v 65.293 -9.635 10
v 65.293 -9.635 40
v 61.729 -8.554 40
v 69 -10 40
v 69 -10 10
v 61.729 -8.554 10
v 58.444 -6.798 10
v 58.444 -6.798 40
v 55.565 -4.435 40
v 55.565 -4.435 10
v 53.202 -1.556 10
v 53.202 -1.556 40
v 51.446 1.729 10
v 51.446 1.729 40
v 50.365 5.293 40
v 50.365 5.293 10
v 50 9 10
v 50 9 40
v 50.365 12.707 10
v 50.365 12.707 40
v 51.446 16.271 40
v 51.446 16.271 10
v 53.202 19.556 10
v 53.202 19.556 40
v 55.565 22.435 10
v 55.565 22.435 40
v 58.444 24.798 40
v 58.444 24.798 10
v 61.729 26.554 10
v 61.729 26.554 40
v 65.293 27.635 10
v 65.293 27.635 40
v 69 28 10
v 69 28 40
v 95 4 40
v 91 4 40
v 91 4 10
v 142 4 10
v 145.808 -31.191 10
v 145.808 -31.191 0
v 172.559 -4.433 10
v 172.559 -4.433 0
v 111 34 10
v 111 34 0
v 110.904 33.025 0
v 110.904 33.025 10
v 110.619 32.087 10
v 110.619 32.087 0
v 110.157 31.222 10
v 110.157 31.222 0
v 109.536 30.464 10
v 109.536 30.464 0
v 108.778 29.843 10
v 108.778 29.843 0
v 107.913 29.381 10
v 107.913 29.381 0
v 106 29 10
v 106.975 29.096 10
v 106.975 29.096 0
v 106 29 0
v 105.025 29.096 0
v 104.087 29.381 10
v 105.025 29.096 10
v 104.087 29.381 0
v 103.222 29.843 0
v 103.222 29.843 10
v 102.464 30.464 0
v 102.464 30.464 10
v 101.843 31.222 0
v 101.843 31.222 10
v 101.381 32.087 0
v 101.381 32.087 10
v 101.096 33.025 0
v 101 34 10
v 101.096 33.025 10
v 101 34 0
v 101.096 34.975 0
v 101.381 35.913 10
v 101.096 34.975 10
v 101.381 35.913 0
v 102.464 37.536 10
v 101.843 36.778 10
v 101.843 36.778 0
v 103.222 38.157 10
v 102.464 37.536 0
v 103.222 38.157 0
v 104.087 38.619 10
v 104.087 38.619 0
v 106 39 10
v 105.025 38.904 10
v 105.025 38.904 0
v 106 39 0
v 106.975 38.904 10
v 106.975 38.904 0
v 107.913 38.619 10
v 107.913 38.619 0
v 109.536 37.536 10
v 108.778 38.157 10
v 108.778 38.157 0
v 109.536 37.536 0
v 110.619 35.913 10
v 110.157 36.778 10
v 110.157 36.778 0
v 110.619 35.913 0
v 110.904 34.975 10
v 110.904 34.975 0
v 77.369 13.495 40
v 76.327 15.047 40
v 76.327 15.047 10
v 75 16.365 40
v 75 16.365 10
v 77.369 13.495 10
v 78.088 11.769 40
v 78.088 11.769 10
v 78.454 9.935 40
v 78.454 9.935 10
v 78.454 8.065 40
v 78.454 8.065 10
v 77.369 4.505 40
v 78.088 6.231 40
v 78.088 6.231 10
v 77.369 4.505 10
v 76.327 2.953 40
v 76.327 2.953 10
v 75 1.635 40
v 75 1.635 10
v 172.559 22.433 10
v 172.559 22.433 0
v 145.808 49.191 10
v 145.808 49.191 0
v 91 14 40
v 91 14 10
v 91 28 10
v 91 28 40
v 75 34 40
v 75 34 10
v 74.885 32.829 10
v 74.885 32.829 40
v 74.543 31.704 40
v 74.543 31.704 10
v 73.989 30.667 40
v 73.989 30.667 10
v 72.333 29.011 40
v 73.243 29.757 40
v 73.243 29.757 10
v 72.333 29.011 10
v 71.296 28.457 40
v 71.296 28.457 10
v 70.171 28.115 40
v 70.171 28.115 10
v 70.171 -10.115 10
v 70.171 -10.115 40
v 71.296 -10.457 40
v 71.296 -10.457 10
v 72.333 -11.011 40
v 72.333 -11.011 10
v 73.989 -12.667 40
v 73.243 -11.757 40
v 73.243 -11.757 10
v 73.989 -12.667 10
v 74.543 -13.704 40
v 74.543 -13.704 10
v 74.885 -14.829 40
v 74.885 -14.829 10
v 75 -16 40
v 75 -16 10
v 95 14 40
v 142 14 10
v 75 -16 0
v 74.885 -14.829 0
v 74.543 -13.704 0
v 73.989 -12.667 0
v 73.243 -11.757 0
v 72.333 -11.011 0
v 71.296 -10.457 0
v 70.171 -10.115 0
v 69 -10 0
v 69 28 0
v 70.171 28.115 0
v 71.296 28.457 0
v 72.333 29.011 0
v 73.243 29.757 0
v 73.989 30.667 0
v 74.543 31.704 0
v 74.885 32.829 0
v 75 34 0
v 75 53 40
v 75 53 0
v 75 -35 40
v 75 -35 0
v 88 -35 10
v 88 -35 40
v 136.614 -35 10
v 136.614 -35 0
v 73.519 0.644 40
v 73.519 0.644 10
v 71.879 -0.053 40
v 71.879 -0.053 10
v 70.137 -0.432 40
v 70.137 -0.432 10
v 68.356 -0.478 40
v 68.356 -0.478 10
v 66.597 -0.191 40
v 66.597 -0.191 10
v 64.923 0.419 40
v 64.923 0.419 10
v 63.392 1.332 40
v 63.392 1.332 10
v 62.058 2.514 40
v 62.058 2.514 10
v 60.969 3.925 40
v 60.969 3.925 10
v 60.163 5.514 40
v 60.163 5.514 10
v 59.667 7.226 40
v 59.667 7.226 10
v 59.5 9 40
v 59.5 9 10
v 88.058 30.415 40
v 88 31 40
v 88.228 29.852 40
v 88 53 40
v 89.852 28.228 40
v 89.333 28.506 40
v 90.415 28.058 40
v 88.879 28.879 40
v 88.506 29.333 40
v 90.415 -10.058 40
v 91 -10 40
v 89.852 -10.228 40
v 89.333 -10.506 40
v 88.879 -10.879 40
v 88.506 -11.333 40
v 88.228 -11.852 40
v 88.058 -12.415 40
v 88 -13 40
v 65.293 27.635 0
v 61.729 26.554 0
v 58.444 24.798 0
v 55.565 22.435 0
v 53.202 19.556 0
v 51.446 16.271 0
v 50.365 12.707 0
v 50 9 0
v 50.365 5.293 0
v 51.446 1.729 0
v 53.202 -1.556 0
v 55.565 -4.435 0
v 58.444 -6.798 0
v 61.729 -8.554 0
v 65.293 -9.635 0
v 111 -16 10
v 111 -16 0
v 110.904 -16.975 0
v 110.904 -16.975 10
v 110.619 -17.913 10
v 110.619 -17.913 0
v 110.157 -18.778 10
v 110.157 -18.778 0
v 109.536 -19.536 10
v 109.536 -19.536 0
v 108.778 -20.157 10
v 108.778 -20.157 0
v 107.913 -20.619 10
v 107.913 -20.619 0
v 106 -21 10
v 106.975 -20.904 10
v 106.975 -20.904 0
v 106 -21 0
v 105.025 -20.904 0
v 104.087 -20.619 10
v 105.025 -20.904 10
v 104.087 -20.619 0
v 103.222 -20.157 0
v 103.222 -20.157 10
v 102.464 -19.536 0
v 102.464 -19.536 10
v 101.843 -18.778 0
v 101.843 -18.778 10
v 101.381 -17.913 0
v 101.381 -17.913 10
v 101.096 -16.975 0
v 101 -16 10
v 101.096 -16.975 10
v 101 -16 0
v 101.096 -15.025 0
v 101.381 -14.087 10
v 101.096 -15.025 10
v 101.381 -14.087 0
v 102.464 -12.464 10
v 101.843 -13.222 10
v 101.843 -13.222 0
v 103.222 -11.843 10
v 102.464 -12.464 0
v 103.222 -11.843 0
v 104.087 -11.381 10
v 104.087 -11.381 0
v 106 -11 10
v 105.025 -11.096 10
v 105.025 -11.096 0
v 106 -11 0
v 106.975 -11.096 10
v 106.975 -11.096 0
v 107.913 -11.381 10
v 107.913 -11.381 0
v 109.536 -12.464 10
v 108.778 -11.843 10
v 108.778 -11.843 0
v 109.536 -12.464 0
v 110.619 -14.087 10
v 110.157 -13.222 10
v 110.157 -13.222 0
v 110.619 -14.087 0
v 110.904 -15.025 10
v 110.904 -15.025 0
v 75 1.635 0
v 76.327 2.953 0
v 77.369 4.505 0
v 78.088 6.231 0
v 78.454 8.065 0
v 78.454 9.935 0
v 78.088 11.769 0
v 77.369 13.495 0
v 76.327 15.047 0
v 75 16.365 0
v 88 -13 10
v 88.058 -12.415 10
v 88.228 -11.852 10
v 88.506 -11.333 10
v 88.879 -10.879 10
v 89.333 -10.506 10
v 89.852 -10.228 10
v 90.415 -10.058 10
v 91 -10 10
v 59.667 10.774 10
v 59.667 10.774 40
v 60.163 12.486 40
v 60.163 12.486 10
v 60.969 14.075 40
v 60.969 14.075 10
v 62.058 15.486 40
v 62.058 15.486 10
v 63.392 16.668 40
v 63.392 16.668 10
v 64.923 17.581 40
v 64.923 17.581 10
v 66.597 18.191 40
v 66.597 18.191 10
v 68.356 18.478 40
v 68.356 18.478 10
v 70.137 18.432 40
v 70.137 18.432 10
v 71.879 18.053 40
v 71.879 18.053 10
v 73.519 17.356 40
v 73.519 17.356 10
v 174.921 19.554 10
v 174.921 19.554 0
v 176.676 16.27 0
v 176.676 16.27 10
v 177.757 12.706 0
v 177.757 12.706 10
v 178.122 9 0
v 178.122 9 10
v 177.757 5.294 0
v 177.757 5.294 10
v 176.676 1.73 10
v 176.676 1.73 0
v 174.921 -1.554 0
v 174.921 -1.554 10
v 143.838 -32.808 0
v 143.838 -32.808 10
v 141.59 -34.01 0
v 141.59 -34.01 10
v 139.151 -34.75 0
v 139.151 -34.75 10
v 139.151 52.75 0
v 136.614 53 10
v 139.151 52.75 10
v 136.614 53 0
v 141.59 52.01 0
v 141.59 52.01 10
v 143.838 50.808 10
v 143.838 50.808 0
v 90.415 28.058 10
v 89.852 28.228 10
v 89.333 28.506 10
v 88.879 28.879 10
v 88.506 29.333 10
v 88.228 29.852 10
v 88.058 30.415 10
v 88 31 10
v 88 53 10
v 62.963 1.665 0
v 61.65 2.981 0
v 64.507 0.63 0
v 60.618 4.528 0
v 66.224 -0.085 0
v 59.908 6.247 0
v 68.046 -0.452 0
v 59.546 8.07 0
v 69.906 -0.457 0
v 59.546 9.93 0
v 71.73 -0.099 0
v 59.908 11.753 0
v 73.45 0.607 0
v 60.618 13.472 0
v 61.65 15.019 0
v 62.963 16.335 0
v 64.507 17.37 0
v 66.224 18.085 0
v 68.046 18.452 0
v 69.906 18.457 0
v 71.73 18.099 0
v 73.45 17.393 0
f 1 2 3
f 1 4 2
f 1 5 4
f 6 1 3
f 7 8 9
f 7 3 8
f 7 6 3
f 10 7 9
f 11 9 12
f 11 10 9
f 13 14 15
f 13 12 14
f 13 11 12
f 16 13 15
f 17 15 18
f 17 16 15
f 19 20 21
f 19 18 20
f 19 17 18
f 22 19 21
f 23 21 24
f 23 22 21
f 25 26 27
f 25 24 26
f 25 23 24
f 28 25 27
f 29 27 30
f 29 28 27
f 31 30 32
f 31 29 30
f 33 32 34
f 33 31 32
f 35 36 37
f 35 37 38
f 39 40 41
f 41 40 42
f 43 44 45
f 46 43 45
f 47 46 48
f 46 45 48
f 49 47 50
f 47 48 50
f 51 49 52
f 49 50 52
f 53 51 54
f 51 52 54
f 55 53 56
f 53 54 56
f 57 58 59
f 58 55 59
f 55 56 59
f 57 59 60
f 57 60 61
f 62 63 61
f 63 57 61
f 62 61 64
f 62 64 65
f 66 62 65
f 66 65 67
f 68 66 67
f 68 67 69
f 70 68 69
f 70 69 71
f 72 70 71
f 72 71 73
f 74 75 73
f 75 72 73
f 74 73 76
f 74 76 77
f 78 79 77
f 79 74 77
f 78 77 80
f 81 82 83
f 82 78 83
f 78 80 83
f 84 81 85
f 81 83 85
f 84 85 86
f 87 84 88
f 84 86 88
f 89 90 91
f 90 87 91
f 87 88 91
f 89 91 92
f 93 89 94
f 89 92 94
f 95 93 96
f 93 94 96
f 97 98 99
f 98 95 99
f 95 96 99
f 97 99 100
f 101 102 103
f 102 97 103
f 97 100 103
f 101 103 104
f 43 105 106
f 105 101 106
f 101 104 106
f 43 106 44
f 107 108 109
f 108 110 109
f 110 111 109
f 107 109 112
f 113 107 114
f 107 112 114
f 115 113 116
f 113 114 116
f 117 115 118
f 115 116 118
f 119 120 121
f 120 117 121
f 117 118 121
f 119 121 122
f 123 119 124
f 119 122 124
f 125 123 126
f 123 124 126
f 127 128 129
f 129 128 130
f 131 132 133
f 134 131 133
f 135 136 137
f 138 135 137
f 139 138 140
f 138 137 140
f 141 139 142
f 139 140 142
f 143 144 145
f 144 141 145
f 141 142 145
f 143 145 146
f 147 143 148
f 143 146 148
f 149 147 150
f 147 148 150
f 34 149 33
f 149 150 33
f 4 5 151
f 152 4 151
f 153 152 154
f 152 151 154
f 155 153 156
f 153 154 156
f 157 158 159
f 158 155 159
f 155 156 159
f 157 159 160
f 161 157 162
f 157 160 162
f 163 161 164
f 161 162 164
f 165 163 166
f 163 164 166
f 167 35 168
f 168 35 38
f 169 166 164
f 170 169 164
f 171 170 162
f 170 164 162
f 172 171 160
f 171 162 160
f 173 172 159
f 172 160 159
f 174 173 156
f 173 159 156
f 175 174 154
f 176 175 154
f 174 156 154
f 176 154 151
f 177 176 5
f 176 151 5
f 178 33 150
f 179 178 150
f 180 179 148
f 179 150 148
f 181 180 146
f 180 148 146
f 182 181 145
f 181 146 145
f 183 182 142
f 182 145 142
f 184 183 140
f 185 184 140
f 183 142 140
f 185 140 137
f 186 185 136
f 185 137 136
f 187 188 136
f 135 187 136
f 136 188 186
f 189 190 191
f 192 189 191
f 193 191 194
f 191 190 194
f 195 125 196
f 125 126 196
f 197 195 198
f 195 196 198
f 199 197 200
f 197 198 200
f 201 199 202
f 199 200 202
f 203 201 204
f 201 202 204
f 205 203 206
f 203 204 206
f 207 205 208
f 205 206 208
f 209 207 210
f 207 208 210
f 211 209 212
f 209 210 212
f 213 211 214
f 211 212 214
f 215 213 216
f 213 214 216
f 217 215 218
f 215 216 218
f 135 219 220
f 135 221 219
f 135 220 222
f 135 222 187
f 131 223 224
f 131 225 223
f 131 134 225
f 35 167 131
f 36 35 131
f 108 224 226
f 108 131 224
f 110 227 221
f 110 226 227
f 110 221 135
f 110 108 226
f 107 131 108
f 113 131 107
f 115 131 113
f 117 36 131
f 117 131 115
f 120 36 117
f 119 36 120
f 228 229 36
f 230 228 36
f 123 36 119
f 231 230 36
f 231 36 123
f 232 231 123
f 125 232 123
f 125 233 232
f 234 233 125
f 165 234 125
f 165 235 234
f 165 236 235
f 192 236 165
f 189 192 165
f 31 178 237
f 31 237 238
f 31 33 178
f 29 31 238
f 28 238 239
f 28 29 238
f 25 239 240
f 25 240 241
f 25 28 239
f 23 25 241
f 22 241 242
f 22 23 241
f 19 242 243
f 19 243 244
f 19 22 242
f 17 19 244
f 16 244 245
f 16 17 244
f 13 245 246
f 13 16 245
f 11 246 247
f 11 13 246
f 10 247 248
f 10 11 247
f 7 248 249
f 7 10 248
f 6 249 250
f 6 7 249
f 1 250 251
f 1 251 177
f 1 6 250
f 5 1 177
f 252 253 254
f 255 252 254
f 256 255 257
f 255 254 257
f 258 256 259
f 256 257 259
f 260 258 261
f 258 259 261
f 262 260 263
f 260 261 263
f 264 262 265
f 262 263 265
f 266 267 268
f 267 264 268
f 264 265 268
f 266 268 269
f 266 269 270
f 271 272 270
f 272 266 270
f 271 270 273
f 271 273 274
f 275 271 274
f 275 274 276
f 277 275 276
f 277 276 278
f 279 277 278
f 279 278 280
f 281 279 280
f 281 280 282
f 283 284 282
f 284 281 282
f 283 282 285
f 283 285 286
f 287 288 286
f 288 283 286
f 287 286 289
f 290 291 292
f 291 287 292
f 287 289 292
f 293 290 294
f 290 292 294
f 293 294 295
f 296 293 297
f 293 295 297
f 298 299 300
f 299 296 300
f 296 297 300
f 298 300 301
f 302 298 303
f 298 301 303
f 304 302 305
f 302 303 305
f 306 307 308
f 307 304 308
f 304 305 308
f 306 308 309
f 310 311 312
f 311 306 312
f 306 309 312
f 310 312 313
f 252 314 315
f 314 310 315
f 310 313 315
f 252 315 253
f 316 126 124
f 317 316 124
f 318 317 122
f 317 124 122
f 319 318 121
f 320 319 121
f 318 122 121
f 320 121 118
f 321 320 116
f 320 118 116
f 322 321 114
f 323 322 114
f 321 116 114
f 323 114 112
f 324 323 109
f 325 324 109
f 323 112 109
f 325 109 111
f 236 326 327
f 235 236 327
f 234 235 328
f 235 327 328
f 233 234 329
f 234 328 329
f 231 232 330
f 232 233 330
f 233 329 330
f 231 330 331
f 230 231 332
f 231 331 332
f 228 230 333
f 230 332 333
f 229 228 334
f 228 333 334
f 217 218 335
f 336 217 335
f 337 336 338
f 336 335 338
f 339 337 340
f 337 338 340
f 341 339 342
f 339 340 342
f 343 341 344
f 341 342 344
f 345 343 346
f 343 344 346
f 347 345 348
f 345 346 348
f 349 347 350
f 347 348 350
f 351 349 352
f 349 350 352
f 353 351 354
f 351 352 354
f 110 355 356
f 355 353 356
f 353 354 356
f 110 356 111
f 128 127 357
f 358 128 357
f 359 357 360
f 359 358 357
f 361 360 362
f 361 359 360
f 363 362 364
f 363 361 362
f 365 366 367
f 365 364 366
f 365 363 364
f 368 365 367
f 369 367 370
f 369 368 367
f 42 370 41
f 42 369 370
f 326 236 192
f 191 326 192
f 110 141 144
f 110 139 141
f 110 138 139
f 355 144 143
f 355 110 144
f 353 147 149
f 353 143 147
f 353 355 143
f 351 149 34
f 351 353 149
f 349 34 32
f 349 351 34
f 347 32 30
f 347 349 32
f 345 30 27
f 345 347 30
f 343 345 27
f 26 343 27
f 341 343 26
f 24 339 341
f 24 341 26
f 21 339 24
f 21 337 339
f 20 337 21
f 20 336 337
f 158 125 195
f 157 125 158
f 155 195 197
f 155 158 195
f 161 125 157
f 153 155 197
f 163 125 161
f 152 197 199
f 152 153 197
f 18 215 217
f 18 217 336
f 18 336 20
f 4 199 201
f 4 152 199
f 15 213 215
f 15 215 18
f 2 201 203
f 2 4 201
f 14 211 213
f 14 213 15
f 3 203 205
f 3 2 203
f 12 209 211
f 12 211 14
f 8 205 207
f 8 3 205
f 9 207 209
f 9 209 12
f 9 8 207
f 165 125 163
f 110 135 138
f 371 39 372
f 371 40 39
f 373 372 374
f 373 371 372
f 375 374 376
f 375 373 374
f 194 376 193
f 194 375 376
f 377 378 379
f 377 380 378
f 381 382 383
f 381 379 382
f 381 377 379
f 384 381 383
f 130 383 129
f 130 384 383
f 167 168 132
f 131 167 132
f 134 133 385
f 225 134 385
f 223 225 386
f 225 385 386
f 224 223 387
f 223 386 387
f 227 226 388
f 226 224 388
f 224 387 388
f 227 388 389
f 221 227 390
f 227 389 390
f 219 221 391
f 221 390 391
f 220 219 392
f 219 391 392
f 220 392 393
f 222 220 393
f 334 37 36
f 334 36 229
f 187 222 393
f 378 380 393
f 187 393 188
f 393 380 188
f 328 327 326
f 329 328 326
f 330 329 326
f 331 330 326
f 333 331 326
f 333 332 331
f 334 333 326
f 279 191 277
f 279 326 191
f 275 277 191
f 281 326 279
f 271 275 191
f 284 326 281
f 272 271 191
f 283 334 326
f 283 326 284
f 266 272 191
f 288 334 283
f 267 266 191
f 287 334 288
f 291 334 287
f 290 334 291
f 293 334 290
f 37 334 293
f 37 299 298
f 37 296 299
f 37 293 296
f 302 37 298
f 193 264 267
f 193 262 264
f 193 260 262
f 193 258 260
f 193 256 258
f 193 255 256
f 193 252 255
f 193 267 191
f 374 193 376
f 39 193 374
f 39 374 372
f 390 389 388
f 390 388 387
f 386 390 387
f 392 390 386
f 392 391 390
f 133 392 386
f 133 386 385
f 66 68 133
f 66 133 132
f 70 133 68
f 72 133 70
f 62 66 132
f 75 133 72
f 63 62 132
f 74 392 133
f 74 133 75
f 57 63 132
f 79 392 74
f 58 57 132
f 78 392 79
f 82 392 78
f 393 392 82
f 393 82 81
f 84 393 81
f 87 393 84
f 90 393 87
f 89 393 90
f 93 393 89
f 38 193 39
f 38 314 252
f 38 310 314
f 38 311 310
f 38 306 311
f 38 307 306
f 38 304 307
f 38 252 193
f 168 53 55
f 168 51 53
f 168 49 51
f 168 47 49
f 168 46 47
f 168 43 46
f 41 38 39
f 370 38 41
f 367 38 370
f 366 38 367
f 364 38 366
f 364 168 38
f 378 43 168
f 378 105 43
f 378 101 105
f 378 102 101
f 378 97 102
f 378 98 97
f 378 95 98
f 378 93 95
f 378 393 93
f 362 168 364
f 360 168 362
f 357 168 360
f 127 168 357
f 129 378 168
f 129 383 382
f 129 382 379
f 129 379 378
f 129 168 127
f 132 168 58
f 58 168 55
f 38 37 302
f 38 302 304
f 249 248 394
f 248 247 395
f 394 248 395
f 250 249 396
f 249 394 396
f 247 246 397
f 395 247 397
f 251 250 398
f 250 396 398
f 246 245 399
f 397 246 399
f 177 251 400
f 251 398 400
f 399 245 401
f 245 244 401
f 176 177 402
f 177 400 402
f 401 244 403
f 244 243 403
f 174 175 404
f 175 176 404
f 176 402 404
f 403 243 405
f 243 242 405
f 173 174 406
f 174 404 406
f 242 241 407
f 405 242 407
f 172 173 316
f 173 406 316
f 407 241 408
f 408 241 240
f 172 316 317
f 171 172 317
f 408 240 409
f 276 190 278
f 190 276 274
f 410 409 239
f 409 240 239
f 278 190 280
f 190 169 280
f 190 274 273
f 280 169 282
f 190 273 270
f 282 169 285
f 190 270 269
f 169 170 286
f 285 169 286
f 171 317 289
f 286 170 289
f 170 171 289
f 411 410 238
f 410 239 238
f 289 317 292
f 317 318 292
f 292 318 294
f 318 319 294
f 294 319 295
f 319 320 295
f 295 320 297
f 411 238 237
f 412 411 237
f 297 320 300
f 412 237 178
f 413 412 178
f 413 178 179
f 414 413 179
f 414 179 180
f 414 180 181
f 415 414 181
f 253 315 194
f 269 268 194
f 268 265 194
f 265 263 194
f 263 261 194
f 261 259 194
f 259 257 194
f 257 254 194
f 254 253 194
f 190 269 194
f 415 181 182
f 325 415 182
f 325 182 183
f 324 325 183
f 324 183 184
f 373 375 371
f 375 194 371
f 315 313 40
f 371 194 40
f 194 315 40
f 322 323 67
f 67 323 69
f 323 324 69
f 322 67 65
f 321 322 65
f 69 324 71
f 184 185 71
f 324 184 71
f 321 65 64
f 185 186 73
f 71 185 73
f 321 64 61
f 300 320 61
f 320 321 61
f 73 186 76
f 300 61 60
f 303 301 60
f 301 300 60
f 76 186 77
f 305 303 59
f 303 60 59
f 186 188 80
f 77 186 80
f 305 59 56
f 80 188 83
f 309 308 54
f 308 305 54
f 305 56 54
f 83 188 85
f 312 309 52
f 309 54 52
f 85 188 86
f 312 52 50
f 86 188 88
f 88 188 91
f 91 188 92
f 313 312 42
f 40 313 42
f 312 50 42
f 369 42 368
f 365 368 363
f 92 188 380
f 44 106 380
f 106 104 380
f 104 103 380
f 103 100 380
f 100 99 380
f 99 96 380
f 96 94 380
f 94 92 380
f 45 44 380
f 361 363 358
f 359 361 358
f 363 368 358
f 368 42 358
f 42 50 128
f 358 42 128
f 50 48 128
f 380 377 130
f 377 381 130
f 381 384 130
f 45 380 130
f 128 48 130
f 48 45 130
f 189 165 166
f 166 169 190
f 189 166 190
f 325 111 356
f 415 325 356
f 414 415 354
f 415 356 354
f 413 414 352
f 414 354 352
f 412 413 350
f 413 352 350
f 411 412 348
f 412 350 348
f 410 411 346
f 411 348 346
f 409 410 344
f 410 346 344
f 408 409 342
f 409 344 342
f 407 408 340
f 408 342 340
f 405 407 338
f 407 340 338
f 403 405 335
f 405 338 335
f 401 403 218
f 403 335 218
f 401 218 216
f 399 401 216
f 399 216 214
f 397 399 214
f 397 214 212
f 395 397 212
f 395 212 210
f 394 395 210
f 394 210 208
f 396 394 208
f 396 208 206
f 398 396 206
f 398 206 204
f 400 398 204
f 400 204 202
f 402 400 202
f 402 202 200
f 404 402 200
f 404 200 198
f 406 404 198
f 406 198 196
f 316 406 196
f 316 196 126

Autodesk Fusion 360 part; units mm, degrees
sketch "base" plane through (0, 0, 0) normal (0, 0, 1) x (1, 0, 0)
  line L0 (75, -35) -> (136.6142, -35)
  line L1 (142, -35) -> (142, 53)
  line L2 (136.6142, 53) -> (75, 53)
  line L3 (75, 53) -> (75, -35)
  line L4 (142, 9) -> (142, 14)
  line L5 (142, 9) -> (142, 4)
  line L6 (136.6142, 53) -> (106, 53)
  line L7 (142, 9) -> (142, 34)
  circle A0 centre (106, 34) radius 5
  line L8 (142, 9) -> (75, 9) construction
  circle A1 centre (106, -16) radius 5
  line L9 (145.8078, -31.1912) -> (172.5588, -4.4333)
  line L10 (172.5588, 22.4333) -> (145.8078, 49.1912)
  arc A2 (172.5588, -4.4333) -> (172.5588, 22.4333) centre (159.122, 9) ccw
  arc A3 (136.6142, -35) -> (145.8078, -31.1912) centre (136.6142, -22) ccw
  arc A4 (145.8078, 49.1912) -> (136.6142, 53) centre (136.6142, 40) ccw
  dimension "d1" = 67
  dimension "d2" = 88
  dimension "d3" = 5
  dimension "d4" = 5
  dimension "d5" = 36
  dimension "d6" = 25
  dimension "d7" = 10
  dimension "d8" = 19
  dimension "d9" = 13
  dimension "d10" = 13
extrude "Extrude1" add sketch "base" along normal blind 10
sketch "top" plane through (0, 0, 10) normal (0, 0, 1) x (-1, 0, 0)
  circle A0 centre (-106, 16) radius 5
  circle A1 centre (-106, -34) radius 5
  arc A2 (-145.8078, -49.1912) -> (-136.6142, -53) centre (-136.6142, -40) ccw
  line L0 (-136.6142, -53) -> (-75, -53)
  line L1 (-75, -53) -> (-75, 35)
  line L2 (-75, 35) -> (-136.6142, 35)
  arc A3 (-136.6142, 35) -> (-145.8078, 31.1912) centre (-136.6142, 22) ccw
  line L3 (-145.8078, 31.1912) -> (-172.5588, 4.4333)
  arc A4 (-172.5588, 4.4333) -> (-172.5588, -22.4333) centre (-159.122, -9) ccw
  line L4 (-172.5588, -22.4333) -> (-145.8078, -49.1912)
  line L5 (-75, -53) -> (-88, -53)
  circle A5 centre (-69, -9) radius 9.5
  line L6 (-142, -14) -> (-95, -14)
  line L7 (-142, -14) -> (-142, -4)
  line L8 (-142, -4) -> (-95, -4)
  line L9 (-95, -4) -> (-95, -14)
  line L10 (-91, -9) -> (-91, -28)
  line L11 (-91, -28) -> (-91, -9)
  line L12 (-91, -9) -> (-91, 10)
  line L13 (-91, -28) -> (-91, -28)
  line L14 (-88, -31) -> (-88, -53)
  line L15 (-91, 10) -> (-91, 10)
  line L16 (-88, 13) -> (-88, 35)
  arc A6 (-88, -31) -> (-91, -28) centre (-91, -31) ccw
  arc A7 (-91, 10) -> (-88, 13) centre (-91, 13) ccw
  line L17 (-95, -14) -> (-91, -14)
  line L18 (-91, -4) -> (-95, -4)
  line L19 (-75, -53) -> (-75, -34)
  line L20 (-88, 35) -> (-75, 35)
  line L21 (-75, 35) -> (-75, 16)
  line L22 (-69, -28) -> (-69, -28)
  arc A8 (-69, -28) -> (-75, -34) centre (-69, -34) ccw
  line L23 (-69, 10) -> (-69, 10)
  arc A9 (-75, 16) -> (-69, 10) centre (-69, 16) ccw
  arc A10 (-69, -28) -> (-69, 10) centre (-69, -9) ccw
  dimension "d13" = 19
  dimension "d14" = 3
  dimension "d15" = 3
  dimension "d16" = 6
  dimension "d17" = 6
extrude "Extrude2" add sketch "top" against normal blind 10 contours L1 A5 A8 A9 A10
extrude "Extrude3" add sketch "top" along normal blind 30 contours L6 L7 L8 L9
sketch "ramp" plane through (0, 4, 0) normal (0, -1, 0) x (1, 0, 0)
  line L0 (95, 10) -> (142, 10)
  line L1 (142, 10) -> (142, 40)
  line L2 (142, 40) -> (95, 40)
  line L3 (95, 40) -> (95, 10)
  line L4 (95, 40) -> (142, 10)
  line L5 (142, 10) -> (142, 40)
  line L6 (95, 40) -> (142, 40)
extrude "Extrude4" cut sketch "ramp" against normal blind 10 contours L1 L2 L4 L5 L6
extrude "Extrude5" add sketch "top" along normal blind 30 contours L9 L10 L11 L12 L17 L18
extrude "Extrude6" add sketch "top" along normal blind 30 contours L0 L1 L2 L5 A5 L10 L11 L12 L14 L16 A6 A7 L19 L20 L21
extrude "Extrude7" add sketch "top" along normal blind 30 contours L1 A5 A8 A9 A10
extrude "Extrude8" cut 1 faces at (75.8602, 7.6409, 10) along direction (0, 0, -1) blind 10
